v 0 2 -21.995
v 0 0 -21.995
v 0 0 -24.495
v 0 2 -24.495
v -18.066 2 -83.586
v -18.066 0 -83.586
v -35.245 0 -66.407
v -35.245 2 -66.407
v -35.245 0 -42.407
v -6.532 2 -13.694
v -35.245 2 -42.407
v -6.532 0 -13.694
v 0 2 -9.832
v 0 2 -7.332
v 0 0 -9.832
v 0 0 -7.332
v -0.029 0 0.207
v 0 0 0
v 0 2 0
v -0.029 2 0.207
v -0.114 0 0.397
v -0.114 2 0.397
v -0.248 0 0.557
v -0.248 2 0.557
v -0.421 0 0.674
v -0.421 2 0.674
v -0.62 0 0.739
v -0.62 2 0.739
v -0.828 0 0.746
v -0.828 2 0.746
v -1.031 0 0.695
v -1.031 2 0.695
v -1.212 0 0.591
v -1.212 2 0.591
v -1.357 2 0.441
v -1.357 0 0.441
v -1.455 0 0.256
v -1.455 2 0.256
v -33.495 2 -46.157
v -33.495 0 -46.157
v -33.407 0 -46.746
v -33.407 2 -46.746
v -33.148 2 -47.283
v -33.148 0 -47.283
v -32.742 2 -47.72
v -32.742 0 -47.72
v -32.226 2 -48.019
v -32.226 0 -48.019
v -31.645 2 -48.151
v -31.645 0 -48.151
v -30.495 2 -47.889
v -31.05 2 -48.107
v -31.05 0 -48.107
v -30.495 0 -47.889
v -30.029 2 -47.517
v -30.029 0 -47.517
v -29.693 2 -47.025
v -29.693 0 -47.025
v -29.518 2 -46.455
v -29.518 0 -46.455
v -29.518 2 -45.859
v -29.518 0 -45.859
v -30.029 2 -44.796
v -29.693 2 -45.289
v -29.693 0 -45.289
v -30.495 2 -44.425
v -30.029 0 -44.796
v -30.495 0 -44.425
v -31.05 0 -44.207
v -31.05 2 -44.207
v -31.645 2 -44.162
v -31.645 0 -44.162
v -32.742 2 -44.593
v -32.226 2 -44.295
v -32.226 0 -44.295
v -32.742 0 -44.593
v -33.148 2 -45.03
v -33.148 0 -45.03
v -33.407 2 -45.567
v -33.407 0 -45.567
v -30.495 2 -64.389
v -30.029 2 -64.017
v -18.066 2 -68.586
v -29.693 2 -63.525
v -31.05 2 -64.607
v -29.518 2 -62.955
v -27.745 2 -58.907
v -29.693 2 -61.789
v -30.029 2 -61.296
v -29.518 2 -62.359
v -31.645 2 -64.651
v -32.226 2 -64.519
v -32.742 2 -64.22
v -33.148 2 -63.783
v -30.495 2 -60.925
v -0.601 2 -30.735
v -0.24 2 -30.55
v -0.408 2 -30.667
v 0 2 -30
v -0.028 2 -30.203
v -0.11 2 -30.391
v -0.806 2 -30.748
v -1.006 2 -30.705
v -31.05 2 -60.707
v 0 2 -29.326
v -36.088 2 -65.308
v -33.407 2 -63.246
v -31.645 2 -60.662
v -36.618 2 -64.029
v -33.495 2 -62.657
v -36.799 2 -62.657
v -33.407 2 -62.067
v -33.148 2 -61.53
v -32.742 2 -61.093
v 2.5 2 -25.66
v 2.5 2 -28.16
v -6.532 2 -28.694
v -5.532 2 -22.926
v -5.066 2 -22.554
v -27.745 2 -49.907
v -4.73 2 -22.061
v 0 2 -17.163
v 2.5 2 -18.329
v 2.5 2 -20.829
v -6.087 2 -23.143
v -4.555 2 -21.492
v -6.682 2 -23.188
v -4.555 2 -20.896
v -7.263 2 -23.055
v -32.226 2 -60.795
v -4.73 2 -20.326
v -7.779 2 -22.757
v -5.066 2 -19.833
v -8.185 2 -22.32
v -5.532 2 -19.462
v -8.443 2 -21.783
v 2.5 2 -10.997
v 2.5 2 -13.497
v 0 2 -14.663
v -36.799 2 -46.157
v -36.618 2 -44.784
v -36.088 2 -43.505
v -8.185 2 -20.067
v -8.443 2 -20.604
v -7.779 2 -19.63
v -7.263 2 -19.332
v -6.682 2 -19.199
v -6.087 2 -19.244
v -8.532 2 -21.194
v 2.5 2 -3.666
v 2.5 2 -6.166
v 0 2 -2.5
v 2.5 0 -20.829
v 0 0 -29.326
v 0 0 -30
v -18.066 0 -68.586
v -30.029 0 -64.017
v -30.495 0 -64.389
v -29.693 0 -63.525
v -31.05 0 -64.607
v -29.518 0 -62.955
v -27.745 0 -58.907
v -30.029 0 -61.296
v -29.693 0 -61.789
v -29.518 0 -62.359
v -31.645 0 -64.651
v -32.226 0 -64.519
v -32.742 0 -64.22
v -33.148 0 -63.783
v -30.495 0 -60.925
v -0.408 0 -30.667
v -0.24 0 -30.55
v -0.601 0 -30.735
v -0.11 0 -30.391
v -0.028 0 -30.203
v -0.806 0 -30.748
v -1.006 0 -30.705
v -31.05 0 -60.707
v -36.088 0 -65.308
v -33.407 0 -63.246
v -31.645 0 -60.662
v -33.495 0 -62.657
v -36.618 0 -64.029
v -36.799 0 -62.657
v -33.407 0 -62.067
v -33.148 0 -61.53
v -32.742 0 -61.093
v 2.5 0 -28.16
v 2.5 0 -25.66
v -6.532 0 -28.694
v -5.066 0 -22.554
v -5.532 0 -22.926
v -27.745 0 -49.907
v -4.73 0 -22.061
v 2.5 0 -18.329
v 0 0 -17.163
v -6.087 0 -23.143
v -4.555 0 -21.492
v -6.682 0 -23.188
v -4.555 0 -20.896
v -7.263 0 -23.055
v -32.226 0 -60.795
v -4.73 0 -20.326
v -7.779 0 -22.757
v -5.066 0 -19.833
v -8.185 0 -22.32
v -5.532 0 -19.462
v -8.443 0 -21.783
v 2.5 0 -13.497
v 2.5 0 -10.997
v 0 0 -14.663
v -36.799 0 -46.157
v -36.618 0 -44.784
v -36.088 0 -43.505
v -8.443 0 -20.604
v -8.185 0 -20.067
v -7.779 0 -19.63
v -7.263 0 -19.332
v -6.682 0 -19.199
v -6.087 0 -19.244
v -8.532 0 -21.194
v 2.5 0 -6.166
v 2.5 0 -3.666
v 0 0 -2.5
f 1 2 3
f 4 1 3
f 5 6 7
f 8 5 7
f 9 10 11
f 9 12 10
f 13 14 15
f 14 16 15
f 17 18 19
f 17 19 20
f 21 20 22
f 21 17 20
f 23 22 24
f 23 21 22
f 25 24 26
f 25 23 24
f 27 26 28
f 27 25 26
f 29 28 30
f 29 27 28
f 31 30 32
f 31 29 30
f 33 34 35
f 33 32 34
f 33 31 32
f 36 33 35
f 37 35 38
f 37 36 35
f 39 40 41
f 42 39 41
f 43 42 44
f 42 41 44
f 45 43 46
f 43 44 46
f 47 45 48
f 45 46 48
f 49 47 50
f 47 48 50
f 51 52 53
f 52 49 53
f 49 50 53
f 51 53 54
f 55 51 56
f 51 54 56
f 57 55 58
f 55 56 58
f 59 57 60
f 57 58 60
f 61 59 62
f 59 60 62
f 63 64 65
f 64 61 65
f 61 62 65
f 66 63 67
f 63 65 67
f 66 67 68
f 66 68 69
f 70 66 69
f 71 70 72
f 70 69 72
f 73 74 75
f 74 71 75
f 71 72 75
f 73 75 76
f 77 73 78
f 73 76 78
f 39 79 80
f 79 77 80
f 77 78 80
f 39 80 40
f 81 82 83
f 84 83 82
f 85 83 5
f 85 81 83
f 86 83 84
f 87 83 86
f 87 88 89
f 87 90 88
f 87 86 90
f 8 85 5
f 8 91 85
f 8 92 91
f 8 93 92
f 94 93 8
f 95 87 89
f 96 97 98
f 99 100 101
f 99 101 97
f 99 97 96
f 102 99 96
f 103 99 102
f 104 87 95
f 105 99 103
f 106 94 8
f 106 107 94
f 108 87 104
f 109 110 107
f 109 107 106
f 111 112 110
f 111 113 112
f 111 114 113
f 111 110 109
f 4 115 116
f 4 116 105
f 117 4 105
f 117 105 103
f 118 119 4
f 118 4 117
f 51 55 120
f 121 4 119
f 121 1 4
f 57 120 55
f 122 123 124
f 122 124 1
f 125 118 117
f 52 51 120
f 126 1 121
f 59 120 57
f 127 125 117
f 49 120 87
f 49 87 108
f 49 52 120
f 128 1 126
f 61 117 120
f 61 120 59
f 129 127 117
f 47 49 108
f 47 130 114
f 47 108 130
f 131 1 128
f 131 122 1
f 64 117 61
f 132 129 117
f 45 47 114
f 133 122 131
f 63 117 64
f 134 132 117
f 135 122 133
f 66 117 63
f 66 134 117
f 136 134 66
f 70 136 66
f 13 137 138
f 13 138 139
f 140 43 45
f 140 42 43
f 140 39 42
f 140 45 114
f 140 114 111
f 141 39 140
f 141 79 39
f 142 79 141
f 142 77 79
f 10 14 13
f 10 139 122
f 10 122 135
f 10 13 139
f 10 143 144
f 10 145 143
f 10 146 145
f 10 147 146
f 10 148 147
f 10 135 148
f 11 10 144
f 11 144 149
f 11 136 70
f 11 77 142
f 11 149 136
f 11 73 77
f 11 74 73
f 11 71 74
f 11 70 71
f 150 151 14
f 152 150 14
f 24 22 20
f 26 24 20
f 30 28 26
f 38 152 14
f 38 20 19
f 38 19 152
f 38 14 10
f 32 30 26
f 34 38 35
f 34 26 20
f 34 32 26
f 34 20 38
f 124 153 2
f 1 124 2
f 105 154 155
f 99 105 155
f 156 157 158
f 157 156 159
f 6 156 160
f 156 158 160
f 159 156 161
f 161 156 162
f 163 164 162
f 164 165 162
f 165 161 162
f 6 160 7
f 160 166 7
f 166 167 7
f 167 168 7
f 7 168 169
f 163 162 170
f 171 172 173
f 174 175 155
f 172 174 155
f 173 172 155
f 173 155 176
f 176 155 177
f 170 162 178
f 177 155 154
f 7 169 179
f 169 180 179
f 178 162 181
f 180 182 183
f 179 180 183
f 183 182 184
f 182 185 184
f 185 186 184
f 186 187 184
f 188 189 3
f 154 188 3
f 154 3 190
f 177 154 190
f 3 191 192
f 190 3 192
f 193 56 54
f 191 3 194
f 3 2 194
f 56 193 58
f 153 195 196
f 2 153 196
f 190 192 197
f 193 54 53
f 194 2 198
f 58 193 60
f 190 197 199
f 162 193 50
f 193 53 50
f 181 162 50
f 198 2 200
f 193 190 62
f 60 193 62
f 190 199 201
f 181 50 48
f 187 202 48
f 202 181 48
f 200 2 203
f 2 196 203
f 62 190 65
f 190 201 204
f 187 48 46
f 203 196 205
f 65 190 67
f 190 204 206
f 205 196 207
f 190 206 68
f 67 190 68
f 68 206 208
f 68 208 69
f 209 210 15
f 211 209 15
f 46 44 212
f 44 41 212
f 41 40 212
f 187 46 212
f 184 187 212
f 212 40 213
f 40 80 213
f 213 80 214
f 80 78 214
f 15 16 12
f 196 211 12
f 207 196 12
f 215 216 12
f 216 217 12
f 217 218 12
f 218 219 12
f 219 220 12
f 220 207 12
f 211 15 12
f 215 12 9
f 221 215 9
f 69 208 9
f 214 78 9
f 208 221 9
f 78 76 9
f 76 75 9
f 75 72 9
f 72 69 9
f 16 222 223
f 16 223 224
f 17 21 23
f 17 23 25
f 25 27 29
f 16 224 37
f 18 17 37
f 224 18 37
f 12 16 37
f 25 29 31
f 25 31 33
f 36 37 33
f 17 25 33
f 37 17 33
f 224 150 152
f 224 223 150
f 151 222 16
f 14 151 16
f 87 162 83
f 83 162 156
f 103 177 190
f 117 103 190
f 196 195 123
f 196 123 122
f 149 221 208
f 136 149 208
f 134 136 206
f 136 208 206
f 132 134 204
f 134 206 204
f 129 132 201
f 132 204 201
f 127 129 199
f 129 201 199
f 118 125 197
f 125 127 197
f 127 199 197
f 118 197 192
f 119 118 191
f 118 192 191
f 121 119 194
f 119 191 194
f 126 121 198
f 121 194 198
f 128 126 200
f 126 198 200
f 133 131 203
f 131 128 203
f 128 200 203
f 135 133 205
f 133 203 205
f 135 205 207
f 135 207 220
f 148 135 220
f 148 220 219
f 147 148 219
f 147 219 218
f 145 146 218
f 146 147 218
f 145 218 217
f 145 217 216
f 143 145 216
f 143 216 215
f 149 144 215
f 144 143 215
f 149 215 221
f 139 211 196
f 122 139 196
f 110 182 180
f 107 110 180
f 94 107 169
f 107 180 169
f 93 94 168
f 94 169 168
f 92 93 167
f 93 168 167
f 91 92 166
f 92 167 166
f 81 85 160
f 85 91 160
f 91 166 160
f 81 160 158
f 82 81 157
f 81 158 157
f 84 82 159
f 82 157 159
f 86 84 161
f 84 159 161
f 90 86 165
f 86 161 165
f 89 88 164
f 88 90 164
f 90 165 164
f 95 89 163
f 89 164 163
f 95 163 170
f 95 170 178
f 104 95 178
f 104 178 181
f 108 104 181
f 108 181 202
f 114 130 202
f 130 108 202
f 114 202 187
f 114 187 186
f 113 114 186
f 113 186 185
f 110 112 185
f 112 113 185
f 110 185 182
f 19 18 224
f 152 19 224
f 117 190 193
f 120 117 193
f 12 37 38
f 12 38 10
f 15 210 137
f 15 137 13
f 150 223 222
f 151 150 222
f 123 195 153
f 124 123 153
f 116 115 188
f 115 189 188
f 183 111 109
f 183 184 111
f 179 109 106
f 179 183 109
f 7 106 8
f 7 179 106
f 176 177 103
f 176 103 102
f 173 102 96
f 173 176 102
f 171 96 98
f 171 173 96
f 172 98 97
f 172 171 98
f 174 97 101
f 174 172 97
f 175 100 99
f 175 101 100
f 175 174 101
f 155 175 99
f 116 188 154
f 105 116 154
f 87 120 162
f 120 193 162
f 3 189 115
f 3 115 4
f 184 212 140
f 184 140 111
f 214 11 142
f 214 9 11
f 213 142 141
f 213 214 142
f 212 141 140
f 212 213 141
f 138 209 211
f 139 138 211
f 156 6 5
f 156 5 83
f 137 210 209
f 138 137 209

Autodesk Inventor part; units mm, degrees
ref_plane "YZ Plane" through (0, 0, 0) normal (1, 0, 0) x (0, 1, 0)
ref_plane "XZ Plane" through (0, 0, 0) normal (0, 1, 0) x (-1, 0, 0)
ref_plane "XY Plane" through (0, 0, 0) normal (0, 0, 1) x (1, 0, 0)
sketch "Sketch1" plane through (0, 0, 0) normal (0, 1, 0) x (-1, 0, 0)
  line L0 (0, 0) -> (0, -30)
  line L1 (0, 0) -> (0.75, 0) construction
  arc A0 (1.4548, 0.2565) -> (0, 0) centre (0.75, 0) ccw
  line L2 (1.4548, 0.2565) -> (6.5322, -13.6936)
  line L3 (0, -30) -> (0.75, -30) construction
  circle A1 centre (0.75, -30) radius 0.75
  line L4 (1.0065, -30.7048) -> (6.5322, -28.6936)
  line L5 (6.5322, -13.6936) -> (6.5322, -28.6936) construction
  line L6 (6.5322, -13.6936) -> (35.2454, -42.4068)
  line L7 (6.5322, -13.6936) -> (66.5322, -13.6936) construction
  line L8 (6.5322, -28.6936) -> (27.7454, -49.9068)
  line L9 (6.5322, -28.6936) -> (36.5322, -28.6936) construction
  line L10 (27.7454, -49.9068) -> (27.7454, -58.9068)
  line L11 (27.7454, -58.9068) -> (6.5322, -80.12)
  line L12 (27.7454, -58.9068) -> (57.7454, -58.9068) construction
  line L13 (35.2454, -42.4068) -> (27.7454, -49.9068) construction
  arc A2 (36.7987, -46.1568) -> (35.2454, -42.4068) centre (31.4954, -46.1568) ccw
  line L14 (36.7987, -46.1568) -> (36.7987, -62.6568)
  line L15 (27.7454, -58.9068) -> (27.7454, -73.9068) construction
  line L16 (27.7454, -73.9068) -> (16.5322, -85.12)
  line L17 (27.7454, -73.9068) -> (35.2454, -66.4068)
  line L18 (27.7454, -58.9068) -> (35.2454, -66.4068) construction
  arc A3 (35.2454, -66.4068) -> (36.7987, -62.6568) centre (31.4954, -62.6568) ccw
  line L19 (6.5322, -80.12) -> (16.5322, -80.12) construction
  line L20 (16.5322, -80.12) -> (16.5322, -85.12) construction
  line L21 (16.5322, -110.12) -> (6.5322, -110.12)
  line L22 (6.5322, -110.12) -> (6.5322, -80.12)
  line L23 (16.5322, -85.12) -> (16.5322, -110.12)
  circle A4 centre (11.5322, -87.62) radius 2
  circle A5 centre (11.5322, -102.62) radius 2
  line L24 (0, -3.6658) -> (-2.5, -3.6658)
  line L25 (-2.5, -3.6658) -> (-2.5, -6.1658)
  line L26 (-2.5, -6.1658) -> (0, -6.1658)
  line L27 (0, -6.1658) -> (0, -3.6658)
  line L28 (-2.5, -3.6658) -> (0, -2.5)
  line L29 (-2.5, -6.1658) -> (0, -7.3315)
  line L30 (0, -10.9973) -> (-2.5, -10.9973)
  line L31 (-2.5, -10.9973) -> (-2.5, -13.4973)
  line L32 (-2.5, -13.4973) -> (0, -13.4973)
  line L33 (-2.5, -10.9973) -> (0, -9.8315)
  line L34 (-2.5, -13.4973) -> (0, -14.6631)
  line L35 (-2.5, -18.3288) -> (-2.5, -20.8288)
  line L36 (-2.5, -20.8288) -> (0, -21.9946)
  line L37 (-2.5, -20.8288) -> (0, -20.8288)
  line L38 (0, -18.3288) -> (-2.5, -18.3288)
  line L39 (-2.5, -18.3288) -> (0, -17.1631)
  line L40 (-2.5, -25.6604) -> (0, -24.4946)
  line L41 (0, -25.6604) -> (-2.5, -25.6604)
  line L42 (-2.5, -25.6604) -> (-2.5, -28.1604)
  line L43 (-2.5, -28.1604) -> (0, -28.1604)
  line L44 (-2.5, -28.1604) -> (0, -29.3262)
  circle A6 centre (6.5322, -21.1936) radius 2
  circle A7 centre (31.4954, -46.1568) radius 2
  circle A8 centre (31.4954, -62.6568) radius 2
  line L45 (18.0663, -78.6361) -> (18.0663, -68.0295) projected
  line L46 (20.5412, -81.111) -> (18.0663, -78.6361) projected
  line L47 (38.2189, -63.4333) -> (20.5412, -81.111) projected
  line L48 (38.2189, -63.4333) -> (30.4407, -55.6551) projected
  line L49 (18.0663, -68.0295) -> (30.4407, -55.6551) projected
  line L50 (18.0663, -78.6361) -> (18.0663, -83.5859)
  point P0 (18.0663, -68.5859)
  dimension "d2" = 30
  dimension "d17" = 0.75
  dimension "d18" = 20
  dimension "d19" = 0.75
  dimension "d20" = 70
  dimension "d21" = 15
  dimension "d28" = 45
  dimension "d29" = 30
  dimension "d30" = 45
  dimension "d31" = 9
  dimension "d34" = 135
  dimension "d35" = 15
  dimension "d36" = 135
  dimension "d38" = 10
  dimension "d39" = 30
  dimension "d40" = 30
  dimension "d41" = 7.5
  dimension "d42" = 5
  dimension "d43" = 7.5
  dimension "d44" = 5
  dimension "d45" = 4
  dimension "d46" = 4
  dimension "d47" = 2.5
  dimension "d48" = 2.5
  dimension "d49" = 25
  dimension "d50" = 25
  dimension "d51" = 2.5
  dimension "d52" = 2.5
  dimension "d53" = 2.5
  dimension "d54" = 25
  dimension "d55" = 25
  dimension "d56" = 2.5
  dimension "d57" = 2.5
  dimension "d58" = 2.5
  dimension "d59" = 25
  dimension "d60" = 25
  dimension "d61" = 2.5
  dimension "d62" = 2.5
  dimension "d63" = 2.5
  dimension "d64" = 25
  dimension "d65" = 25
  dimension "d66" = 2.5
  dimension "d69" = 4
  dimension "d70" = 4
  dimension "d71" = 4
extrude "Extrusion2" add sketch "Sketch1" along normal blind 2 contours A0 L2 L6 A2 L14 L48 L49 L10 L8 L4 A1 L0 | L0 L24 L28 | L0 L26 L25 L24 | L0 L29 L26 | L0 L30 L33 | L14 A3 L17 L16 L46 L45 L11 L10 L49 L48 | L0 L32 L31 L30 | L0 L34 L32 | L0 L38 L39 | L16 L50 L46 | L0 L37 L35 L38 | A1 | L0 L36 L37 | L44 L43 L0 | L0 L41 L40 | L43 L42 L41 L0
properties part number "claw_dynamic_gripper"
